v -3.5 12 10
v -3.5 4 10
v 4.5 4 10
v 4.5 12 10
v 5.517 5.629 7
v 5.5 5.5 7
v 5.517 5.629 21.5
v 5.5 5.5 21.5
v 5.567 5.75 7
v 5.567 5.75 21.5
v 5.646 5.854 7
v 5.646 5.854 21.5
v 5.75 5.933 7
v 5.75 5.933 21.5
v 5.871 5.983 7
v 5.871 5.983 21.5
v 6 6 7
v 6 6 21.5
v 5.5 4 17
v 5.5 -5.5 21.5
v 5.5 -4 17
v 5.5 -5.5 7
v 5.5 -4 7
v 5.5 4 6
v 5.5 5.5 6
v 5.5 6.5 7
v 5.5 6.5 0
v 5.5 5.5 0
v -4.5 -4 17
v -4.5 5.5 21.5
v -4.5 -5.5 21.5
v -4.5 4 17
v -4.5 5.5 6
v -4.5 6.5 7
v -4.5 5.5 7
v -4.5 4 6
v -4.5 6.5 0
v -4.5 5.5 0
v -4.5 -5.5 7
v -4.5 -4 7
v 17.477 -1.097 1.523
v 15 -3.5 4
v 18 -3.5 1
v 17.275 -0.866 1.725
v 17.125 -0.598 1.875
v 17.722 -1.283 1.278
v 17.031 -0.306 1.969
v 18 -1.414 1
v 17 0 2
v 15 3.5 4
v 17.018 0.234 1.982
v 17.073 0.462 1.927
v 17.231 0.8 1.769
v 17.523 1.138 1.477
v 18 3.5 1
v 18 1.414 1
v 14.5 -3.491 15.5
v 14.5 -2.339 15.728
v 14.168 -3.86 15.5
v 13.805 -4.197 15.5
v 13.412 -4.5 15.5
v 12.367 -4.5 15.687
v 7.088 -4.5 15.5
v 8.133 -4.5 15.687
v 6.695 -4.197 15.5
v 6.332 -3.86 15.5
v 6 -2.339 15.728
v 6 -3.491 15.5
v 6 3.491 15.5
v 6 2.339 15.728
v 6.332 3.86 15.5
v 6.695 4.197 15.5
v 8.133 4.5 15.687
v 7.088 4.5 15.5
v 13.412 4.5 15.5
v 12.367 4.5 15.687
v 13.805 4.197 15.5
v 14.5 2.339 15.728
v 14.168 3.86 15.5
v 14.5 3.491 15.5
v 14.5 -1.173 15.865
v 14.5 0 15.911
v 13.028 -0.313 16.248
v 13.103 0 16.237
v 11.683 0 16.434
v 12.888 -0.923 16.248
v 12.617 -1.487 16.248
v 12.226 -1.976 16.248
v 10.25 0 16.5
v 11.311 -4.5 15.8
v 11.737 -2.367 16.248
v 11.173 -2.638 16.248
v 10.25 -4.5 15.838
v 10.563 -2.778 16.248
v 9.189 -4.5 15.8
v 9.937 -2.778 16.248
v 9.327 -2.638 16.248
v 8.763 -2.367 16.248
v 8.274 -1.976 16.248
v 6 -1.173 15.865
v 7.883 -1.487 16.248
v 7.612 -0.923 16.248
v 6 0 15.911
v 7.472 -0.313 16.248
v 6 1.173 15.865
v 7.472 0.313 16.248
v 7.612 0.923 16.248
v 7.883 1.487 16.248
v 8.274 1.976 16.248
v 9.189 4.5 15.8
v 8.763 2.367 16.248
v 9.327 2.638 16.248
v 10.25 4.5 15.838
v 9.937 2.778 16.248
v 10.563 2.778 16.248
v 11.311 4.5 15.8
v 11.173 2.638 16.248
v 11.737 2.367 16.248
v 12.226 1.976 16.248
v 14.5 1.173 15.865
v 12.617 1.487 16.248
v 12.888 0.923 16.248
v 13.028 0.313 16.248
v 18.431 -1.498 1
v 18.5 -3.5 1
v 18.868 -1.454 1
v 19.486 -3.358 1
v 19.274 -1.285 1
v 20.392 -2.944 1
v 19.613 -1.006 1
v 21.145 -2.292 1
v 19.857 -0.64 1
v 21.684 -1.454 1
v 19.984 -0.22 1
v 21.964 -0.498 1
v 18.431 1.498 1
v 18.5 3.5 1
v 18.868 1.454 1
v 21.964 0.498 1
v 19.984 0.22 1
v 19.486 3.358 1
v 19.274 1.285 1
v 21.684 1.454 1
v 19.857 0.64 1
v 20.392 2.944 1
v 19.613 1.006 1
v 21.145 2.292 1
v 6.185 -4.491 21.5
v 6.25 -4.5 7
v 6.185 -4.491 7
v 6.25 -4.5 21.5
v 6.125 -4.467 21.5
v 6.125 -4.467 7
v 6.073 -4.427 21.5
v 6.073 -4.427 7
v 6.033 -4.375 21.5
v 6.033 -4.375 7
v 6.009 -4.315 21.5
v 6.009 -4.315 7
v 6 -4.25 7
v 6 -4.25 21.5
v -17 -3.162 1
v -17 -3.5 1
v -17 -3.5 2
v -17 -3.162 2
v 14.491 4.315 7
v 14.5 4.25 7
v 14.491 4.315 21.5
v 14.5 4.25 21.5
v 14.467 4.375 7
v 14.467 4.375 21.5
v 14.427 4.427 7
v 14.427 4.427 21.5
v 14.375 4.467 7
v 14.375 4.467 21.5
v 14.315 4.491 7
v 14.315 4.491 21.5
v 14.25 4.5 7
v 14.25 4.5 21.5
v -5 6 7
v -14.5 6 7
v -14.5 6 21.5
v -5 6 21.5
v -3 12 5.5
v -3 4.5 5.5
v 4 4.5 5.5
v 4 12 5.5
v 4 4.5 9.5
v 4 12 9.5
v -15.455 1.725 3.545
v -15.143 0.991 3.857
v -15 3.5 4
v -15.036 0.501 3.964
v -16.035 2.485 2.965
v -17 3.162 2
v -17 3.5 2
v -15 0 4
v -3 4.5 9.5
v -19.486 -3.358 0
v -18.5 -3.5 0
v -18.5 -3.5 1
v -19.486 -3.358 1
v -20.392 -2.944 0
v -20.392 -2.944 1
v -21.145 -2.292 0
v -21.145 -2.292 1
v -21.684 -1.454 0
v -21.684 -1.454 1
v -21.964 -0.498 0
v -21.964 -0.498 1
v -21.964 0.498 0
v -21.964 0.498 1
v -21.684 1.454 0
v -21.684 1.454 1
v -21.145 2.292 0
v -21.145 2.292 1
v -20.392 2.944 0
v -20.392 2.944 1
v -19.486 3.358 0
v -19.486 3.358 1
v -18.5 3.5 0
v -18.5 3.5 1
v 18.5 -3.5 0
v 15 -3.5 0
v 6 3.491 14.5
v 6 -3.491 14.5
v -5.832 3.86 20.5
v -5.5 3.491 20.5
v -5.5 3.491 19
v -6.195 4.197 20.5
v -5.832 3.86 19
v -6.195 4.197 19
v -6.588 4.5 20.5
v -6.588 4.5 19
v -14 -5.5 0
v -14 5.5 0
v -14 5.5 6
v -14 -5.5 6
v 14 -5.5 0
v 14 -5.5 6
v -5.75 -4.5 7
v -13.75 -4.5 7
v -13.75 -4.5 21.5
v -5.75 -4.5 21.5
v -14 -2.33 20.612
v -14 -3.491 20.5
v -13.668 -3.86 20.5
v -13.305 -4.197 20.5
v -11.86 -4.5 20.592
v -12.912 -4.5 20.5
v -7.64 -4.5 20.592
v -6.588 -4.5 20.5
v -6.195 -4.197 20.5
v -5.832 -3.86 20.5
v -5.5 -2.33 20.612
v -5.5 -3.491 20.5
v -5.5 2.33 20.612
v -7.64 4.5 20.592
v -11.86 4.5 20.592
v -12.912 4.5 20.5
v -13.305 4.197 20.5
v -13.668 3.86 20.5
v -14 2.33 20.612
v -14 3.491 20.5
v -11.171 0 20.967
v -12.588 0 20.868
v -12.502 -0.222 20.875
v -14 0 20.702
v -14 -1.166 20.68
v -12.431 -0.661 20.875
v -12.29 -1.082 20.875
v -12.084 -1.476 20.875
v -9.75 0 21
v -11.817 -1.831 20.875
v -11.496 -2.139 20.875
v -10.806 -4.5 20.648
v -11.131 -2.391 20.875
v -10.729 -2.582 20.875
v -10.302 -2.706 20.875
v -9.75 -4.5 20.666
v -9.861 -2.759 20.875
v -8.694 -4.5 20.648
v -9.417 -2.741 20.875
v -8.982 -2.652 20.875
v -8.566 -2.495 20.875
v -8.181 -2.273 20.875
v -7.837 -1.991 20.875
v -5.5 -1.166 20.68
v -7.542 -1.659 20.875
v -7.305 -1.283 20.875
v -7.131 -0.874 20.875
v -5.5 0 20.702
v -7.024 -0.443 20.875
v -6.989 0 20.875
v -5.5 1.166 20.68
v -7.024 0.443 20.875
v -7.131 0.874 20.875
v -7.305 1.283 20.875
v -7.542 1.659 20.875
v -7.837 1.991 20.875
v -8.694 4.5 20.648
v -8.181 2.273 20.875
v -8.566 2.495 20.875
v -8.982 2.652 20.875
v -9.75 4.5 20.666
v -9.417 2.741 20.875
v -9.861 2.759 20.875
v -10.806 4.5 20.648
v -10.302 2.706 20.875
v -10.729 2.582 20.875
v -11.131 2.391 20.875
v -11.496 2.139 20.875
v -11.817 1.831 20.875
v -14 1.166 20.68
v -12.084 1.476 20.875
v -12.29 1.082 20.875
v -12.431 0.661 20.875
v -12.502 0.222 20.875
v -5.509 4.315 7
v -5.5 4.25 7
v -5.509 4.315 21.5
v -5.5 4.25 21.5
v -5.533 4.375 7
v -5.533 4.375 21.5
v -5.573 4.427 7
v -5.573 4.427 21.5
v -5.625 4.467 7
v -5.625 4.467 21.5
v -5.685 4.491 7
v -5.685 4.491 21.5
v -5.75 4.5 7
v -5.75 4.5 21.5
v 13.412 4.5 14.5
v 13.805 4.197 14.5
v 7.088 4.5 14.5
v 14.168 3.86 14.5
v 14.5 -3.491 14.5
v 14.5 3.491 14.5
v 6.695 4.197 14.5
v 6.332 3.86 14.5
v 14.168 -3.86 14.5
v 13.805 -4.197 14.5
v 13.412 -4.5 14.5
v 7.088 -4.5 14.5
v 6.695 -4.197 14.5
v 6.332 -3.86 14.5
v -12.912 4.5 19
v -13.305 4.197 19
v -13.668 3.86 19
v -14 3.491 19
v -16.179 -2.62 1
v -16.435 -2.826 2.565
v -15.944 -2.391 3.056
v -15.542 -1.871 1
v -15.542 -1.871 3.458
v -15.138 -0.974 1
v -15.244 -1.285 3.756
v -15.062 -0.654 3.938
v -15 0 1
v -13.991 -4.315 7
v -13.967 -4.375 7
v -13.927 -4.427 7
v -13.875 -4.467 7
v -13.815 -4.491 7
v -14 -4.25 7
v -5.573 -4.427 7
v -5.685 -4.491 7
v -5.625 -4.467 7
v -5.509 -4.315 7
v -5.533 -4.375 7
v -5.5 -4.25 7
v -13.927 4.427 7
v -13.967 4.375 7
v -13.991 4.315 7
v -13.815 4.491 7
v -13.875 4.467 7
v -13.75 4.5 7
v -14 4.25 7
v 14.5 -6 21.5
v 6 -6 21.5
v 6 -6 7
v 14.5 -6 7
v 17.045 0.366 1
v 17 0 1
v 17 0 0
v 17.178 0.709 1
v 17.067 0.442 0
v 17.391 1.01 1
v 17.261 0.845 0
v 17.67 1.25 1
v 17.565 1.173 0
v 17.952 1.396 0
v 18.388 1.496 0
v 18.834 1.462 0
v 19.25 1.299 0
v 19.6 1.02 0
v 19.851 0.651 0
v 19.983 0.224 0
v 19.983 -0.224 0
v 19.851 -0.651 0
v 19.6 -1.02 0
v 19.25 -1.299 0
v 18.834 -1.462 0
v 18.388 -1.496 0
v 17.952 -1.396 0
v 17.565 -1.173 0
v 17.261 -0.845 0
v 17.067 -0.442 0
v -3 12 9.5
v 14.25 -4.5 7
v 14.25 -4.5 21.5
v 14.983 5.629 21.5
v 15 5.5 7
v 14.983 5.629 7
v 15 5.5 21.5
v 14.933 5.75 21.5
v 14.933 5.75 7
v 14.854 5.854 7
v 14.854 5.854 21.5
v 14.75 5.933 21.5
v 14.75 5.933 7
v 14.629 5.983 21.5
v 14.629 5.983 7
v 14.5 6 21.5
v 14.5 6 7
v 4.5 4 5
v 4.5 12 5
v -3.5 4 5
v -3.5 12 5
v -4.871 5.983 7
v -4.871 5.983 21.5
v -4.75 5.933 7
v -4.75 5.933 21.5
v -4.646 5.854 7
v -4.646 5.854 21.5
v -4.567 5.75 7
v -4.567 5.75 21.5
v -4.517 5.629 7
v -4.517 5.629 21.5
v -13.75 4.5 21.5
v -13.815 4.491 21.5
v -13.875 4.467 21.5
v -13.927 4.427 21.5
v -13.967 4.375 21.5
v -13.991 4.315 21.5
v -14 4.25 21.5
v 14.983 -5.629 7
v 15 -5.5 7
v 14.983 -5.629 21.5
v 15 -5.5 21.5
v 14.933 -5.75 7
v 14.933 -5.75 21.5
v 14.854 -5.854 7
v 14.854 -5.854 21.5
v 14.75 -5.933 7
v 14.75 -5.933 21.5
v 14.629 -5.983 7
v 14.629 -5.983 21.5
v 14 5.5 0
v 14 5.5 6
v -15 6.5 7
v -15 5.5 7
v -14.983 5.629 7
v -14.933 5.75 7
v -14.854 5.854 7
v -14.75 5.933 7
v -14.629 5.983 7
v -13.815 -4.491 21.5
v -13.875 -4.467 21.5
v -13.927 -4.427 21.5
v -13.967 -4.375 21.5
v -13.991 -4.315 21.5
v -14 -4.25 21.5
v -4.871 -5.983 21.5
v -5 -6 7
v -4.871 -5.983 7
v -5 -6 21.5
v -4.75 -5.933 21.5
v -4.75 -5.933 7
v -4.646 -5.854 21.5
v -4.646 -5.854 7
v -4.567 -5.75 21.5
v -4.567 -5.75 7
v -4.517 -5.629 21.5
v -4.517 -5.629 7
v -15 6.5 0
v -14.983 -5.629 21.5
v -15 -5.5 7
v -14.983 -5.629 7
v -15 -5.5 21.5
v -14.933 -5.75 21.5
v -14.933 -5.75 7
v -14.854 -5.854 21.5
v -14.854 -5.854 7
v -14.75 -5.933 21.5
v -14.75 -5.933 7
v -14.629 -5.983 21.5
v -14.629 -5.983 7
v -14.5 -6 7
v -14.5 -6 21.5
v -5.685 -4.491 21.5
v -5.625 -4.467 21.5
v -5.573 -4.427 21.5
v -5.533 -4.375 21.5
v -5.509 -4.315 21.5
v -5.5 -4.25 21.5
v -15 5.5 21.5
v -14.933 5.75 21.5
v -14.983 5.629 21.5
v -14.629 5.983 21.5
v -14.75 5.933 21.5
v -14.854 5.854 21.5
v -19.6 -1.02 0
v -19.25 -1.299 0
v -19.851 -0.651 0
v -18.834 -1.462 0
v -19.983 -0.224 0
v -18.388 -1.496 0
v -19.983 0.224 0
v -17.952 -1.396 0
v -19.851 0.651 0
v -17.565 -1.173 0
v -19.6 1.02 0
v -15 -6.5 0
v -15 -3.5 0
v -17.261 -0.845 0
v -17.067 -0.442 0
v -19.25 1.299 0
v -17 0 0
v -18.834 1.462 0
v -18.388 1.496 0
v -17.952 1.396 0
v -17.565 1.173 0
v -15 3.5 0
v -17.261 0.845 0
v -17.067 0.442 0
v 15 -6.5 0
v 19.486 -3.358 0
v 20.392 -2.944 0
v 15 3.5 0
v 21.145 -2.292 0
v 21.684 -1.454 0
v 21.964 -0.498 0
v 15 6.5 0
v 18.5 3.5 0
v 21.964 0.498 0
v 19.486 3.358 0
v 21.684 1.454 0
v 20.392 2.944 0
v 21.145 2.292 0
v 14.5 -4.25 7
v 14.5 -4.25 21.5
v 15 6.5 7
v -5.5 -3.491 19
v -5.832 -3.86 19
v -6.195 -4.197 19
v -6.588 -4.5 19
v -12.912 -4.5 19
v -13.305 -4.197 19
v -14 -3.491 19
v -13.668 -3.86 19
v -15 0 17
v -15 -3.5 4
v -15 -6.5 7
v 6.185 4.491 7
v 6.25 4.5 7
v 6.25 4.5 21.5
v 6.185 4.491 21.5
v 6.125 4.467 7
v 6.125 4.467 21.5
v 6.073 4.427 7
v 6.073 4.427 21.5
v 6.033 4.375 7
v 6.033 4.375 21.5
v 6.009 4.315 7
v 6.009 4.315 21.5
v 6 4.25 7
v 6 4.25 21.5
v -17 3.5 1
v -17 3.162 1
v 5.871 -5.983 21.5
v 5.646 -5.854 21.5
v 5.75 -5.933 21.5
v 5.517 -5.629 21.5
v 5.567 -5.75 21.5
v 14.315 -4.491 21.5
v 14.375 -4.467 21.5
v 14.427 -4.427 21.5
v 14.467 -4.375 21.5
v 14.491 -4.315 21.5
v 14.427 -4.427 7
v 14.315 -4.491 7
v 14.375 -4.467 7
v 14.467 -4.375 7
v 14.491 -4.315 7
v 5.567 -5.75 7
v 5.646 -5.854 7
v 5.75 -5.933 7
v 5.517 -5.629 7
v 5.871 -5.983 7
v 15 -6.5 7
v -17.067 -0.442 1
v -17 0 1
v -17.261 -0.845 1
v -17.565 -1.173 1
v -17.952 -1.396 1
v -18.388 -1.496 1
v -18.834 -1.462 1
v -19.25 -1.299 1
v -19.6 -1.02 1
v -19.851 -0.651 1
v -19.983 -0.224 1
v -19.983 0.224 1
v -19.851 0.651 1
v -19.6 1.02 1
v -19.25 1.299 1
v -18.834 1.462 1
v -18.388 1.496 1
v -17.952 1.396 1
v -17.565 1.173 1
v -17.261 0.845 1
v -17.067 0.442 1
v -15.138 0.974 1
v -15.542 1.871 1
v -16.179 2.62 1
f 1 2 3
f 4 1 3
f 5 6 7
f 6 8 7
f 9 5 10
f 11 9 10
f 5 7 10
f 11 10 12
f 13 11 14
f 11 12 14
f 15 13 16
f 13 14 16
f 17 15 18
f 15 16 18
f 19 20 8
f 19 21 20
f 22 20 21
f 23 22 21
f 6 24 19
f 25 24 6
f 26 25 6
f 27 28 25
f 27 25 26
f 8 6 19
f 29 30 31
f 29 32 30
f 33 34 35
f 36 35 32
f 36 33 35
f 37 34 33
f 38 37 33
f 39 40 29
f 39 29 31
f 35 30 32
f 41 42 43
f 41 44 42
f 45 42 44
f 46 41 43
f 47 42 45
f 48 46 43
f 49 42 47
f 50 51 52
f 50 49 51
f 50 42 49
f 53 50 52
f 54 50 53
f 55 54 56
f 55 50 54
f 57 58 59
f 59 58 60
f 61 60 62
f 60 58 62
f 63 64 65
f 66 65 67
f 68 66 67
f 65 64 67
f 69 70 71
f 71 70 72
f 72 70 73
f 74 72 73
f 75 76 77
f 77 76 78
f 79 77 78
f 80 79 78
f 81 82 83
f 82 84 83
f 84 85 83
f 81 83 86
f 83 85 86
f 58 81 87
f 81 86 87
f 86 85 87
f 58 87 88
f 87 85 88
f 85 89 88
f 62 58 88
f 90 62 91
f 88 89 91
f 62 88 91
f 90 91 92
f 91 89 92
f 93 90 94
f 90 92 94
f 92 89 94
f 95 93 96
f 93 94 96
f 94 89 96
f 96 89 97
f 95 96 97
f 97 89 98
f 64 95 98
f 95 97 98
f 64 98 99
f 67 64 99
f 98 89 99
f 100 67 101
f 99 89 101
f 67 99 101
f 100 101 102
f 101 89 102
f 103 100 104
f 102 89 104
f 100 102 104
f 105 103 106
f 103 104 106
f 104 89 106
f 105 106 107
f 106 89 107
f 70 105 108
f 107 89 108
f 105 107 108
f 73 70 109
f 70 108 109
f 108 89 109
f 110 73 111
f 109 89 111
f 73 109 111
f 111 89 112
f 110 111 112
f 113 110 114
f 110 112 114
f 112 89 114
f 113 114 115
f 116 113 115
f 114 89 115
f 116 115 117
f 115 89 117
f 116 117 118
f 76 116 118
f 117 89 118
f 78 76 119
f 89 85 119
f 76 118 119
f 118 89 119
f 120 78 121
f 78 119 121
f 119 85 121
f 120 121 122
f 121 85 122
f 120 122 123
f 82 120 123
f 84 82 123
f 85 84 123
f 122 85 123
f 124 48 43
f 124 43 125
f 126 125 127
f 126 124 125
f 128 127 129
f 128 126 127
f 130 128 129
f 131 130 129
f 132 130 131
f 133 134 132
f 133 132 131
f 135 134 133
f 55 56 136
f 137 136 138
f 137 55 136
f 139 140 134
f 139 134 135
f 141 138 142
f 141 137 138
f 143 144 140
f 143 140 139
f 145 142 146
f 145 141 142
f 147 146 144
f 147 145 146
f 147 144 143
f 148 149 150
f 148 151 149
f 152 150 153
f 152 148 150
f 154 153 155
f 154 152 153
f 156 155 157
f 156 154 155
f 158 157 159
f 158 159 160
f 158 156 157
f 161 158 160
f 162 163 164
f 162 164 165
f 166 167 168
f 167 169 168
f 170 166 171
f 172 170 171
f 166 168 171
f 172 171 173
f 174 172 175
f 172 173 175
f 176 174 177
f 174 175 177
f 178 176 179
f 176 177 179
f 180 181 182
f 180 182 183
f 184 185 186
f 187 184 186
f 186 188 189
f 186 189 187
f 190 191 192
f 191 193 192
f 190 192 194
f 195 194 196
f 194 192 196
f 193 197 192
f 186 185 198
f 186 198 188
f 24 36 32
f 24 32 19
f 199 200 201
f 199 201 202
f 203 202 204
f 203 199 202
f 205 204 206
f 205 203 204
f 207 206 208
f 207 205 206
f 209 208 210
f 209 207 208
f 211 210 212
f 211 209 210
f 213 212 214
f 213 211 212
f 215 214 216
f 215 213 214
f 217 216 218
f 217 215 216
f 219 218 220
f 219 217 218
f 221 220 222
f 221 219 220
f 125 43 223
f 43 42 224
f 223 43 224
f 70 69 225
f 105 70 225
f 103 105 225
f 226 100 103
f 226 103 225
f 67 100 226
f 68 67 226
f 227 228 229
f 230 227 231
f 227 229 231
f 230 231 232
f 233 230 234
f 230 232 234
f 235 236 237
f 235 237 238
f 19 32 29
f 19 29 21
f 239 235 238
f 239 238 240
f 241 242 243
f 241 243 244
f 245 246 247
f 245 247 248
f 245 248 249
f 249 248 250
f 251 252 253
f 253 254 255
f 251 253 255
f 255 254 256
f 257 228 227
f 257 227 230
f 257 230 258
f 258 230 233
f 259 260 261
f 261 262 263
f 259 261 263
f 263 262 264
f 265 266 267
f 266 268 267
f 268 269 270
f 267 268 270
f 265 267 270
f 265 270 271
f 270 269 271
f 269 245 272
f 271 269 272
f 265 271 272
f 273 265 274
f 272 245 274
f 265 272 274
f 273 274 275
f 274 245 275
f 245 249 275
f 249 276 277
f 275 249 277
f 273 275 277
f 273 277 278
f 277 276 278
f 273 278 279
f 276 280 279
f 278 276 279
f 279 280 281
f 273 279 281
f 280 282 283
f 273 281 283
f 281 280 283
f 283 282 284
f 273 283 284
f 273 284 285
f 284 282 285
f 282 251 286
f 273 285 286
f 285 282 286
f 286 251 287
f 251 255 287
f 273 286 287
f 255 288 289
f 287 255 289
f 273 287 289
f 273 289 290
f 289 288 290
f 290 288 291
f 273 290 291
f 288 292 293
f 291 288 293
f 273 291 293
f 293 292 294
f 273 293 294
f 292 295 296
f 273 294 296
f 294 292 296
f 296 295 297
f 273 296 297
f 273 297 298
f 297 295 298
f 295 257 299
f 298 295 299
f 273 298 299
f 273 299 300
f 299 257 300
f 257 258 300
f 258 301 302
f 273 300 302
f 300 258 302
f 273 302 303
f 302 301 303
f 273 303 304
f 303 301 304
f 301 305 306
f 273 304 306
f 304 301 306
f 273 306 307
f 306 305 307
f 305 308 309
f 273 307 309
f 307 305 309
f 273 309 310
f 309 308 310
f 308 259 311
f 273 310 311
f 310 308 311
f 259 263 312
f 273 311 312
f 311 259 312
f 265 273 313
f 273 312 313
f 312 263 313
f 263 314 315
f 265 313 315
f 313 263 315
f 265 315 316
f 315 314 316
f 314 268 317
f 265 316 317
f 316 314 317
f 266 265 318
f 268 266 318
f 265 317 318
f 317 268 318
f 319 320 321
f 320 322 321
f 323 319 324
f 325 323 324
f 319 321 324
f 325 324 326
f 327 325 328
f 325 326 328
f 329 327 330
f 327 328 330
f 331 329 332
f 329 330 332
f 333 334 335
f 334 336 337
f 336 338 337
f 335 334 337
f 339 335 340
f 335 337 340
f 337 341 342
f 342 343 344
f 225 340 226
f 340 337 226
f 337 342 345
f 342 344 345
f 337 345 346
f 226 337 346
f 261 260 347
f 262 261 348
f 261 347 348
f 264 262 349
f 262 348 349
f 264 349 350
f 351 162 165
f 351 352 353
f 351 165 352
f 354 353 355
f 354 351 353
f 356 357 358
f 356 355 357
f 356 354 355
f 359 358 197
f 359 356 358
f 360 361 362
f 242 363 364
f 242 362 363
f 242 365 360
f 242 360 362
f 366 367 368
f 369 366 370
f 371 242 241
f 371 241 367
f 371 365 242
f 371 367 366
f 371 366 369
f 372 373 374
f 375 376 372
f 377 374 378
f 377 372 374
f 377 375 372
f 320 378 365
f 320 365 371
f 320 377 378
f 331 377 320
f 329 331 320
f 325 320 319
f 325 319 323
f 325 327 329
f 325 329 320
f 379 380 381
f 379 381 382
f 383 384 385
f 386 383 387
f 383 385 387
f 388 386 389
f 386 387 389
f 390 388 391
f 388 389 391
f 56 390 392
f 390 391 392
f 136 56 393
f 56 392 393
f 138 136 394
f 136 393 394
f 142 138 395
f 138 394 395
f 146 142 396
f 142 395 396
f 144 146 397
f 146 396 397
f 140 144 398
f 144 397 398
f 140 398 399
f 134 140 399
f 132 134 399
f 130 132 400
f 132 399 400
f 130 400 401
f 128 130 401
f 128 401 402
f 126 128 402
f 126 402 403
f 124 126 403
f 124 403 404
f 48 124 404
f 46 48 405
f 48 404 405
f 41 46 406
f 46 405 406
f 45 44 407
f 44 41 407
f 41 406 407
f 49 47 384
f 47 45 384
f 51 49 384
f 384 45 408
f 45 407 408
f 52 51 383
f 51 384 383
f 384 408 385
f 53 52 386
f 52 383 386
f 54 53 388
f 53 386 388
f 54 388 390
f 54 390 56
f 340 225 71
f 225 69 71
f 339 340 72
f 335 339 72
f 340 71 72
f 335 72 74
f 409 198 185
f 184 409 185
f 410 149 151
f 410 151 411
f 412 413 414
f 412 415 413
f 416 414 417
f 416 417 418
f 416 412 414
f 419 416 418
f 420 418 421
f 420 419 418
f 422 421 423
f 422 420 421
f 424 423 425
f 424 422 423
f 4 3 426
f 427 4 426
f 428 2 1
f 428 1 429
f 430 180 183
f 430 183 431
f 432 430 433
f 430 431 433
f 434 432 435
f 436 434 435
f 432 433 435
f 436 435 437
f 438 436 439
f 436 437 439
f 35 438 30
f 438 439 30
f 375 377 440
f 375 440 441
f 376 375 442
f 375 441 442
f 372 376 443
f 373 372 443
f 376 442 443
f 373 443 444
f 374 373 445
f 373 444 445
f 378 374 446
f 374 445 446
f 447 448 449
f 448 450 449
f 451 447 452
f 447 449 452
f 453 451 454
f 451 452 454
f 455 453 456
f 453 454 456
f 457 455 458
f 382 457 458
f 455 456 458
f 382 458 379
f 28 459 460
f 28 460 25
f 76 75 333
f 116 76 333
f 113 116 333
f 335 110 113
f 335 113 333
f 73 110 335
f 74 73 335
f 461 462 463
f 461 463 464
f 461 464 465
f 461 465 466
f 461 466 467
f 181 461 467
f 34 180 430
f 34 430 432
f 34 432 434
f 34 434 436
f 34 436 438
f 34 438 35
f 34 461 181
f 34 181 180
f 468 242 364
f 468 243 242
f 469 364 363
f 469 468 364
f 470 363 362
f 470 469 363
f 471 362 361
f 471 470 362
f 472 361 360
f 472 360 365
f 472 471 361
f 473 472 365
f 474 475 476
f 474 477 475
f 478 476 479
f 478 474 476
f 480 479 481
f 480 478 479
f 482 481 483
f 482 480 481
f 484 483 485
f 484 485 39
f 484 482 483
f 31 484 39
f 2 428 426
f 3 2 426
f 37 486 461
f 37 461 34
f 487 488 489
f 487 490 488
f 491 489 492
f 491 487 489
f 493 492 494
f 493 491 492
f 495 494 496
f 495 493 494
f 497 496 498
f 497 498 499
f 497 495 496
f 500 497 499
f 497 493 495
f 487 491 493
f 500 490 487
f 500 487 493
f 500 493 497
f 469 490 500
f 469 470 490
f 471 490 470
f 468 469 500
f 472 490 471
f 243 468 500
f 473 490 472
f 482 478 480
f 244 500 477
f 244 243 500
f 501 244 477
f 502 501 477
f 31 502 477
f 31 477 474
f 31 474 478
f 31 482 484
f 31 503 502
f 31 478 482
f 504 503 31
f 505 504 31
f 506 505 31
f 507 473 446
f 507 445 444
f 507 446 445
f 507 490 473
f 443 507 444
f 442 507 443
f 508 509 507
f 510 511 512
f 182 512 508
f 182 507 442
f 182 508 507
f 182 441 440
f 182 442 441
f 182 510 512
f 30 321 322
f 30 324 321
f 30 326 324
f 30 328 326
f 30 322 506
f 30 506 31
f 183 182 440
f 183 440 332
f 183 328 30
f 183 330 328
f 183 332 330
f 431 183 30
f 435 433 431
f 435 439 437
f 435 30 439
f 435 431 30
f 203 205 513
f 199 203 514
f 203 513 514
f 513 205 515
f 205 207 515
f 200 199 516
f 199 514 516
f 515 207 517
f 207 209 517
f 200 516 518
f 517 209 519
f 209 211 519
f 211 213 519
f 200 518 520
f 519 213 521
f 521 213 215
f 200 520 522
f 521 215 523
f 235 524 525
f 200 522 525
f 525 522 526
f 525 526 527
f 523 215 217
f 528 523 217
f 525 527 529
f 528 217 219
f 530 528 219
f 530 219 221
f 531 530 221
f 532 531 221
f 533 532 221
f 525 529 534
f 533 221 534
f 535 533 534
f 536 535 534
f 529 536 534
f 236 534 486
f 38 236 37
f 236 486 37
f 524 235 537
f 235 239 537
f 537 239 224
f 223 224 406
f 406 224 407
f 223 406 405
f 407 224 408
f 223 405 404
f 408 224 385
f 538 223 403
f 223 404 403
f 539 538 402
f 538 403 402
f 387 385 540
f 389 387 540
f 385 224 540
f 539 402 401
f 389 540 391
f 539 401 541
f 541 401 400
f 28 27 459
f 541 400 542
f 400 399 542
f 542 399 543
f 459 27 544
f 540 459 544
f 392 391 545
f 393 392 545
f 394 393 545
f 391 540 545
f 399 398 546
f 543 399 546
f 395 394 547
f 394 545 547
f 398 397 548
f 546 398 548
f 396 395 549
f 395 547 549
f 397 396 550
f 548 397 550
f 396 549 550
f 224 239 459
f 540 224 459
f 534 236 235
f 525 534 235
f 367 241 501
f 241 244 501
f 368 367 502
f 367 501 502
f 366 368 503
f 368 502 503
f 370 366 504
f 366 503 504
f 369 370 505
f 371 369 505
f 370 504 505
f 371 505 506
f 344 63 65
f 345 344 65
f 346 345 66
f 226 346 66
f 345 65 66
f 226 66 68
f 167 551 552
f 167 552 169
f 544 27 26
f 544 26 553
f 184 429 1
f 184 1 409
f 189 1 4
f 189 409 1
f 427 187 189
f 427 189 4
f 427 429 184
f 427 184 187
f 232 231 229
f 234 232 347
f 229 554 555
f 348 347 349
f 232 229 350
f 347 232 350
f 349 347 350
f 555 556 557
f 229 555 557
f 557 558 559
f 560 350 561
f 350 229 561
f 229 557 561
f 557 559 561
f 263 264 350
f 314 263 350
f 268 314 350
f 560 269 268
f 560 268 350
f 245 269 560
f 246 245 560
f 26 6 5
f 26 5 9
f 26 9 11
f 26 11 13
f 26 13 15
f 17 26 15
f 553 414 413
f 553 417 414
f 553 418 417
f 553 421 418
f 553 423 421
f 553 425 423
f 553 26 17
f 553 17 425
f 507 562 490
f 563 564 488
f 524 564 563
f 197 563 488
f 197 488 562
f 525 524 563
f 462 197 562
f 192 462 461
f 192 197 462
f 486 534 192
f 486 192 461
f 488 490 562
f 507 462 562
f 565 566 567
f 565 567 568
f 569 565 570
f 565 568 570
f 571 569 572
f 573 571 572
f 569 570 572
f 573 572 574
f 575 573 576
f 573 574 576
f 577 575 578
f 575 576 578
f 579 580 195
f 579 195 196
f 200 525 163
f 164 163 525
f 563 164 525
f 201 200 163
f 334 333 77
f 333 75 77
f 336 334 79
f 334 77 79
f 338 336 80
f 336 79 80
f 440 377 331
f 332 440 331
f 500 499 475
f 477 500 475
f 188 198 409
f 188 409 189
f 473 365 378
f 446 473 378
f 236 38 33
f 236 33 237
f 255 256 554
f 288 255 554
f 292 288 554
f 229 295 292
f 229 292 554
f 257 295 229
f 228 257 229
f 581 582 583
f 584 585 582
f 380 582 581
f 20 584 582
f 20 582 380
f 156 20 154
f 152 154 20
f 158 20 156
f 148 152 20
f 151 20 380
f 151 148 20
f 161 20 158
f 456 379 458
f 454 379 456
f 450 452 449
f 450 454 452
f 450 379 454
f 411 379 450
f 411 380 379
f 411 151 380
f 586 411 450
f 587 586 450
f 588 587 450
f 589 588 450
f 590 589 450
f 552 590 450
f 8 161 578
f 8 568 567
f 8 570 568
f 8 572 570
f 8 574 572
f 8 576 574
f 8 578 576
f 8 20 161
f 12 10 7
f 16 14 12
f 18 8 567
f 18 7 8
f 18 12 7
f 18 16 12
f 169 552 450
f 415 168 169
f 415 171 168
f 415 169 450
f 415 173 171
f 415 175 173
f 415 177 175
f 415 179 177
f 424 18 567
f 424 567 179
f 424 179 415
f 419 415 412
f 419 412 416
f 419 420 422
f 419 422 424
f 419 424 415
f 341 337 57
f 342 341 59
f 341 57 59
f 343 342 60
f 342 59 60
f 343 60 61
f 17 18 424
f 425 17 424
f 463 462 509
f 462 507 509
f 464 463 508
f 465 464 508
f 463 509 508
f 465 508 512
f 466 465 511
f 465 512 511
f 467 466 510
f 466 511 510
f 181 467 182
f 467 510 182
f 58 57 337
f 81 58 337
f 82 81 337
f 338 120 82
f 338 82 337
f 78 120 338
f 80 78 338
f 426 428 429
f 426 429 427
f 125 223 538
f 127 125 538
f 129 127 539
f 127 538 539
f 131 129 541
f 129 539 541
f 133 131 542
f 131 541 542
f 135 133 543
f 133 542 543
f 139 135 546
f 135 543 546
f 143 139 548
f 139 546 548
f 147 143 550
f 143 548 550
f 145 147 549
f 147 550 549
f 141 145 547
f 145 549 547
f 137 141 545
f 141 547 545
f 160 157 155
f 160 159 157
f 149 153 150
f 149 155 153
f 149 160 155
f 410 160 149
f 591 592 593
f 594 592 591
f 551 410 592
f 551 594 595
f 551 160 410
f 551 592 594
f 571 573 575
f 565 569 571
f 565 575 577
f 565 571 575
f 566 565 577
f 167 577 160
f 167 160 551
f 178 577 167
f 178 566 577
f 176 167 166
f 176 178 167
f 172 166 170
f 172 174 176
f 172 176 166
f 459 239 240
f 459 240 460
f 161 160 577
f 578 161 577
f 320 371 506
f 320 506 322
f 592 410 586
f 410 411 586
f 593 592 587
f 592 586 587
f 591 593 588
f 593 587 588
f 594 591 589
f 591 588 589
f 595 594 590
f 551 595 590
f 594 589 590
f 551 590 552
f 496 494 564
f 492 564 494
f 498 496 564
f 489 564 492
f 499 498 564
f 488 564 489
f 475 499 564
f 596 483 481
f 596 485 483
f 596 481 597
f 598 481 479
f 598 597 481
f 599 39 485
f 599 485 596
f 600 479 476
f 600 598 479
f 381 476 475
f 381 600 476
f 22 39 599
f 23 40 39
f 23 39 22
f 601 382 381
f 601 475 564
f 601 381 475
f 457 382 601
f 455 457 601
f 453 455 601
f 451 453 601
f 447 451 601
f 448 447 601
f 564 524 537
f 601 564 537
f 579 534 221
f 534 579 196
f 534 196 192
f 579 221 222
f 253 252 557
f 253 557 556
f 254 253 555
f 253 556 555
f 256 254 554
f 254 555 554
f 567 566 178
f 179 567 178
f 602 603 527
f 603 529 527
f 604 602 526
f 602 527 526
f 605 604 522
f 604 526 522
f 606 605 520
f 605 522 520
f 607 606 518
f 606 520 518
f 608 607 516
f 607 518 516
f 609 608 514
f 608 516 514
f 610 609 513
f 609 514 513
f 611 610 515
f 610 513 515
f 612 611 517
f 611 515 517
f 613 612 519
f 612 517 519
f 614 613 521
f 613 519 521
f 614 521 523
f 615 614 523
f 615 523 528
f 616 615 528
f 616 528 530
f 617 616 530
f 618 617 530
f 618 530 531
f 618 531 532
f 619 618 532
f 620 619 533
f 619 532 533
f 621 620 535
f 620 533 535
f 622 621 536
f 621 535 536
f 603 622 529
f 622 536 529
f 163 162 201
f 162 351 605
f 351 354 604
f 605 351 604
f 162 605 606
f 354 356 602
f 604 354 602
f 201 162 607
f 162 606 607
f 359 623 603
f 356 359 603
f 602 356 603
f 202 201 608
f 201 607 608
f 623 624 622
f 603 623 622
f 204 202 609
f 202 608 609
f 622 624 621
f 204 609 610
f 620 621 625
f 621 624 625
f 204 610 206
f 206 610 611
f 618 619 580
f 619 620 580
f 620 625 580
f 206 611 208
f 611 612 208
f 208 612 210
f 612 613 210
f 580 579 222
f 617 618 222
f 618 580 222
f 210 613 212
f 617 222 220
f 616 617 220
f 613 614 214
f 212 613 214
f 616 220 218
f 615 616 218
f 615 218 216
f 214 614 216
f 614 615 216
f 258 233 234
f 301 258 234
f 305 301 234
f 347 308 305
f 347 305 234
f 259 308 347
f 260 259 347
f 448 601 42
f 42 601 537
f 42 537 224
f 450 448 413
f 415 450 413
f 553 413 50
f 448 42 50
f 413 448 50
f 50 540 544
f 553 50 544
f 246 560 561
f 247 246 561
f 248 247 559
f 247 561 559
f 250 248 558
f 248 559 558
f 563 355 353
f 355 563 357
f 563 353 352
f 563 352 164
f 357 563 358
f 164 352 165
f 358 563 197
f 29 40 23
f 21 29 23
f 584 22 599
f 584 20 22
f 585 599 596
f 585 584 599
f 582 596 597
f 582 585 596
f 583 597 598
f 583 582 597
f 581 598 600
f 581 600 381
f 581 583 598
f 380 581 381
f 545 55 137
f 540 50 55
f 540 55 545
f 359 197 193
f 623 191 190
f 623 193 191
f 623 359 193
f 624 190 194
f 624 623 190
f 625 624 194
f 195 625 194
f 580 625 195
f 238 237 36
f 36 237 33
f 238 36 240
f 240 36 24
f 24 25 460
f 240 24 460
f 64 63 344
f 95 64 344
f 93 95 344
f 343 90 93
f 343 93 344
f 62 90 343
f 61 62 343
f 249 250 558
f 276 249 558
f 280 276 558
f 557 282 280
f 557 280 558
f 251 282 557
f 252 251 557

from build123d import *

# Parameters (mm, degrees)
SKETCH5_W           = 30
SKETCH5_H           = 13
BOSS_EXTRUDE1_DEPTH = 7
SKETCH6_W           = 10.5
SKETCH6_H           = 12
SKETCH6_W_2         = 8.5
SKETCH6_H_2         = 9
SKETCH6_W_3         = 9.5
BOSS_EXTRUDE2_DEPTH = 14.5
SKETCH7_W           = 10
SKETCH7_H           = 8
BOSS_EXTRUDE3_DEPTH = 10
FILLET1_R           = 0.25
FILLET2_R           = 0.5
SKETCH8_R           = 1.5
BOSS_EXTRUDE4_DEPTH = 1
CHAMFER1_SIZE       = 3
CUT_EXTRUDE1_START  = -16
CUT_EXTRUDE1_DEPTH  = 16
SKETCH12_OUTSIDE_W  = 56.134
SKETCH12_OUTSIDE_H  = 25.134
CUT_EXTRUDE2_DEPTH  = 2.5
SKETCH14_OUTSIDE_W  = 56.134
SKETCH14_OUTSIDE_H  = 25.134
CUT_EXTRUDE5_DEPTH  = 7
CUT_EXTRUDE6_DEPTH  = 6
SKETCH16_W          = 10
SKETCH16_H          = 2.5
CUT_EXTRUDE7_DEPTH  = 1
SKETCH17_W          = 8
SKETCH17_H          = 5
BOSS_EXTRUDE5_DEPTH = 8
SHELL1_T            = -0.5


with BuildPart() as part:
    # Sketch5 → Boss-Extrude1 (new body)
    with BuildSketch(Plane.XY):
        Rectangle(SKETCH5_W, SKETCH5_H)
    extrude(amount=BOSS_EXTRUDE1_DEPTH)

    # Sketch6 → Boss-Extrude2 (add)
    # profile 1 of 2: a face of its own
    with BuildSketch(Plane.XY.offset(7)):
        with Locations((-9.75, 0)):
            Rectangle(SKETCH6_W, SKETCH6_H)
        with Locations((-9.75, 0)):
            Rectangle(SKETCH6_W_2, SKETCH6_H_2, mode=Mode.SUBTRACT)
    # profile 2 of 2: a face of its own
    with BuildSketch(Plane.XY.offset(7)):
        with Locations((10.25, 0)):
            Rectangle(SKETCH6_W_3, SKETCH6_H)
        with Locations((10.25, 0)):
            Rectangle(SKETCH6_W_2, SKETCH6_H_2, mode=Mode.SUBTRACT)
    extrude(amount=BOSS_EXTRUDE2_DEPTH)

    # Sketch7 → Boss-Extrude3 (add)
    with BuildSketch(Plane.XY.offset(7)):
        with Locations((0.5, 0)):
            Rectangle(SKETCH7_W, SKETCH7_H)
    extrude(amount=BOSS_EXTRUDE3_DEPTH)

    # Fillet1
    fillet1_edges = [part.edges().sort_by_distance(p)[0] for p in [
        (-14, -4.5, 14.25),
        (-5.5, -4.5, 14.25),
        (-5.5, 4.5, 14.25),
        (-14, 4.5, 14.25),
        (6, -4.5, 14.25),
        (14.5, -4.5, 14.25),
        (14.5, 4.5, 14.25),
        (6, 4.5, 14.25),
    ]]
    fillet(fillet1_edges, radius=FILLET1_R)

    # Fillet2
    fillet2_edges = [part.edges().sort_by_distance(p)[0] for p in [
        (15, -6, 14.25),
        (5.5, -6, 14.25),
        (-4.5, -6, 14.25),
        (-15, -6, 14.25),
        (-15, 6, 14.25),
        (5.5, 6, 14.25),
        (15, 6, 14.25),
        (-4.5, 6, 14.25),
    ]]
    fillet(fillet2_edges, radius=FILLET2_R)

    # Sketch8 → Boss-Extrude4 (add)
    # profile 1 of 2: a face of its own
    with BuildSketch(Plane(origin=(0, 0, 0), x_dir=(-1, 0, 0), z_dir=(0, 0, -1))):
        with BuildLine():
            Line((-18.5, 3.5), (-15, 3.5))
            Line((-15, 3.5), (-15, -3.5))
            Line((-15, -3.5), (-18.5, -3.5))
            ThreePointArc((-18.5, -3.5), (-22, 0), (-18.5, 3.5))
        make_face()
        with Locations((-18.5, 0)):
            Circle(SKETCH8_R, mode=Mode.SUBTRACT)
    # profile 2 of 2: a face of its own
    with BuildSketch(Plane(origin=(0, 0, 0), x_dir=(-1, 0, 0), z_dir=(0, 0, -1))):
        with BuildLine():
            Line((15, -3.5), (18.5, -3.5))
            ThreePointArc((18.5, -3.5), (22, 0), (18.5, 3.5))
            Line((18.5, 3.5), (15, 3.5))
            Line((15, 3.5), (15, -3.5))
        make_face()
        with Locations(Location((18.5, 0, 0), (0, 0, 180))):
            Circle(SKETCH8_R, mode=Mode.SUBTRACT)
    extrude(amount=-BOSS_EXTRUDE4_DEPTH)

    # Chamfer1
    # the kernel refuses this chamfer: 3 mm, written as the material it adds along each edge
    with BuildSketch(Plane(origin=(15, 3.5, 1), x_dir=(-0.0274958766105862, 0, 0.9996219169112968), z_dir=(0, -1, 0))) as chamfer1_piece_1_section:
        Polygon((CHAMFER1_SIZE * 0.999621916911, -CHAMFER1_SIZE * 0.0274958766106), (-CHAMFER1_SIZE * 0.0274958766106, -CHAMFER1_SIZE * 0.999621916911), (0, 0), align=None)
    chamfer1_piece_1 = extrude(amount=7, mode=Mode.PRIVATE)
    chamfer1_piece_1 = chamfer1_piece_1 - Plane(origin=(18.5, 0, 2.014951553), x_dir=(-1, 0, 0), z_dir=(0, 0, -1)) * Cylinder(1.5, 26, mode=Mode.PRIVATE)
    add(chamfer1_piece_1)
    with BuildSketch(Plane(origin=(-15, 3.5, 1), x_dir=(0.0274958766105862, 0, 0.9996219169112968), z_dir=(0, -1, 0))) as chamfer1_piece_2_section:
        Polygon((CHAMFER1_SIZE * 0.999621916911, CHAMFER1_SIZE * 0.0274958766106), (-CHAMFER1_SIZE * 0.0274958766106, CHAMFER1_SIZE * 0.999621916911), (0, 0), align=None)
    chamfer1_piece_2 = extrude(amount=7, mode=Mode.PRIVATE)
    chamfer1_piece_2 = chamfer1_piece_2 - Plane(origin=(-18.5, 0, 2.014951553), x_dir=(1, 0, 0), z_dir=(0, 0, -1)) * Cylinder(1.5, 26, mode=Mode.PRIVATE)
    add(chamfer1_piece_2)

    # Sketch10 → Cut-Extrude1 (cut)
    with BuildSketch(Plane.XY.offset(17).offset(CUT_EXTRUDE1_START)):
        with BuildLine():
            Line((-17, 3.5), (-18.5, 3.5))
            ThreePointArc((-18.5, 3.5), (-22, 0), (-18.5, -3.5))
            Line((-18.5, -3.5), (-17, -3.5))
            Line((-17, -3.5), (-17, -3.16227766))
            ThreePointArc((-17, -3.16227766), (-15.541960108, -1.870828693), (-15, 0))
            ThreePointArc((-15, 0), (-15.541960108, 1.870828693), (-17, 3.16227766))
            Line((-17, 3.16227766), (-17, 3.5))
        make_face()
    extrude(amount=CUT_EXTRUDE1_DEPTH, mode=Mode.SUBTRACT)

    # Sketch15 → Cut-Extrude6 (cut)
    with BuildSketch(Plane(origin=(0, 0, 0), x_dir=(-1, 0, 0), z_dir=(0, 0, -1))):
        Polygon((14, -5.5), (-14, -5.5), (-14, 5.5), (-5.5, 5.5), (-5.5, 6.5), (4.5, 6.5), (4.5, 5.5), (14, 5.5), align=None)
    extrude(amount=-CUT_EXTRUDE6_DEPTH, mode=Mode.SUBTRACT)

    # Sketch16 → Cut-Extrude7 (cut)
    with BuildSketch(Plane(origin=(0, 0, 6), x_dir=(-1, 0, 0), z_dir=(0, 0, -1))):
        with Locations((-0.5, 5.25)):
            Rectangle(SKETCH16_W, SKETCH16_H)
    extrude(amount=-CUT_EXTRUDE7_DEPTH, mode=Mode.SUBTRACT)


with BuildPart() as body_2:
    # Sketch11 → Revolve1 (revolve)
    with BuildSketch(Plane(origin=(0, 0, 0), x_dir=(-1, 0, 0), z_dir=(0, 1, 0))):
        with BuildLine():
            Line((15.25, 20.5), (15.25, 19))
            Line((15.25, 19), (9.75, 19))
            Line((9.75, 19), (9.75, 21))
            ThreePointArc((9.75, 21), (12.511340254, 20.874742797), (15.25, 20.5))
        make_face()
    revolve(axis=Axis((-9.75, 0, 19), (0, 0, 1)))

    # Sketch12 outside → Cut-Extrude2 (cut)
    with BuildSketch(Plane.XY.offset(21.5)):
        Rectangle(SKETCH12_OUTSIDE_W, SKETCH12_OUTSIDE_H)
        with BuildLine():
            Line((-14, 4.25), (-14, -4.25))
            ThreePointArc((-14, -4.25), (-13.926776695, -4.426776695), (-13.75, -4.5))
            Line((-13.75, -4.5), (-5.75, -4.5))
            ThreePointArc((-5.75, -4.5), (-5.573223305, -4.426776695), (-5.5, -4.25))
            Line((-5.5, -4.25), (-5.5, 4.25))
            ThreePointArc((-5.5, 4.25), (-5.573223305, 4.426776695), (-5.75, 4.5))
            Line((-5.75, 4.5), (-13.75, 4.5))
            ThreePointArc((-13.75, 4.5), (-13.926776695, 4.426776695), (-14, 4.25))
        make_face(mode=Mode.SUBTRACT)
    extrude(amount=-CUT_EXTRUDE2_DEPTH, mode=Mode.SUBTRACT)


with BuildPart() as body_3:
    # Sketch13 → Revolve2 (revolve)
    with BuildSketch(Plane(origin=(0, 0, 0), x_dir=(-1, 0, 0), z_dir=(0, 1, 0))):
        with BuildLine():
            Line((-10.25, 14.5), (-15.75, 14.5))
            Line((-15.75, 14.5), (-15.75, 15.5))
            ThreePointArc((-15.75, 15.5), (-13.045084972, 16.247967345), (-10.25, 16.5))
            Line((-10.25, 16.5), (-10.25, 14.5))
        make_face()
    revolve(axis=Axis((10.25, 0, 16.5), (0, 0, -1)))

    # Sketch14 outside → Cut-Extrude5 (cut)
    with BuildSketch(Plane.XY.offset(21.5)):
        Rectangle(SKETCH14_OUTSIDE_W, SKETCH14_OUTSIDE_H)
        with BuildLine():
            Line((14.25, 4.5), (6.25, 4.5))
            ThreePointArc((6.25, 4.5), (6.073223305, 4.426776695), (6, 4.25))
            Line((6, 4.25), (6, -4.25))
            ThreePointArc((6, -4.25), (6.073223305, -4.426776695), (6.25, -4.5))
            Line((6.25, -4.5), (14.25, -4.5))
            ThreePointArc((14.25, -4.5), (14.426776695, -4.426776695), (14.5, -4.25))
            Line((14.5, -4.25), (14.5, 4.25))
            ThreePointArc((14.5, 4.25), (14.426776695, 4.426776695), (14.25, 4.5))
        make_face(mode=Mode.SUBTRACT)
    extrude(amount=-CUT_EXTRUDE5_DEPTH, mode=Mode.SUBTRACT)


with BuildPart() as body_4:
    # Sketch17 → Boss-Extrude5 (new body)
    with BuildSketch(Plane(origin=(0, 4, 0), x_dir=(1, 0, 0), z_dir=(0, 1, 0))):
        with Locations((0.5, -7.5)):
            Rectangle(SKETCH17_W, SKETCH17_H)
    extrude(amount=BOSS_EXTRUDE5_DEPTH)

    # Shell1
    shell1_openings = [body_4.faces().sort_by_distance(p)[0] for p in [
        (0.5, 12, 7.5),
    ]]
    offset(amount=SHELL1_T, openings=shell1_openings, kind=Kind.INTERSECTION)


solid = Compound([part.part, body_2.part, body_3.part, body_4.part])
